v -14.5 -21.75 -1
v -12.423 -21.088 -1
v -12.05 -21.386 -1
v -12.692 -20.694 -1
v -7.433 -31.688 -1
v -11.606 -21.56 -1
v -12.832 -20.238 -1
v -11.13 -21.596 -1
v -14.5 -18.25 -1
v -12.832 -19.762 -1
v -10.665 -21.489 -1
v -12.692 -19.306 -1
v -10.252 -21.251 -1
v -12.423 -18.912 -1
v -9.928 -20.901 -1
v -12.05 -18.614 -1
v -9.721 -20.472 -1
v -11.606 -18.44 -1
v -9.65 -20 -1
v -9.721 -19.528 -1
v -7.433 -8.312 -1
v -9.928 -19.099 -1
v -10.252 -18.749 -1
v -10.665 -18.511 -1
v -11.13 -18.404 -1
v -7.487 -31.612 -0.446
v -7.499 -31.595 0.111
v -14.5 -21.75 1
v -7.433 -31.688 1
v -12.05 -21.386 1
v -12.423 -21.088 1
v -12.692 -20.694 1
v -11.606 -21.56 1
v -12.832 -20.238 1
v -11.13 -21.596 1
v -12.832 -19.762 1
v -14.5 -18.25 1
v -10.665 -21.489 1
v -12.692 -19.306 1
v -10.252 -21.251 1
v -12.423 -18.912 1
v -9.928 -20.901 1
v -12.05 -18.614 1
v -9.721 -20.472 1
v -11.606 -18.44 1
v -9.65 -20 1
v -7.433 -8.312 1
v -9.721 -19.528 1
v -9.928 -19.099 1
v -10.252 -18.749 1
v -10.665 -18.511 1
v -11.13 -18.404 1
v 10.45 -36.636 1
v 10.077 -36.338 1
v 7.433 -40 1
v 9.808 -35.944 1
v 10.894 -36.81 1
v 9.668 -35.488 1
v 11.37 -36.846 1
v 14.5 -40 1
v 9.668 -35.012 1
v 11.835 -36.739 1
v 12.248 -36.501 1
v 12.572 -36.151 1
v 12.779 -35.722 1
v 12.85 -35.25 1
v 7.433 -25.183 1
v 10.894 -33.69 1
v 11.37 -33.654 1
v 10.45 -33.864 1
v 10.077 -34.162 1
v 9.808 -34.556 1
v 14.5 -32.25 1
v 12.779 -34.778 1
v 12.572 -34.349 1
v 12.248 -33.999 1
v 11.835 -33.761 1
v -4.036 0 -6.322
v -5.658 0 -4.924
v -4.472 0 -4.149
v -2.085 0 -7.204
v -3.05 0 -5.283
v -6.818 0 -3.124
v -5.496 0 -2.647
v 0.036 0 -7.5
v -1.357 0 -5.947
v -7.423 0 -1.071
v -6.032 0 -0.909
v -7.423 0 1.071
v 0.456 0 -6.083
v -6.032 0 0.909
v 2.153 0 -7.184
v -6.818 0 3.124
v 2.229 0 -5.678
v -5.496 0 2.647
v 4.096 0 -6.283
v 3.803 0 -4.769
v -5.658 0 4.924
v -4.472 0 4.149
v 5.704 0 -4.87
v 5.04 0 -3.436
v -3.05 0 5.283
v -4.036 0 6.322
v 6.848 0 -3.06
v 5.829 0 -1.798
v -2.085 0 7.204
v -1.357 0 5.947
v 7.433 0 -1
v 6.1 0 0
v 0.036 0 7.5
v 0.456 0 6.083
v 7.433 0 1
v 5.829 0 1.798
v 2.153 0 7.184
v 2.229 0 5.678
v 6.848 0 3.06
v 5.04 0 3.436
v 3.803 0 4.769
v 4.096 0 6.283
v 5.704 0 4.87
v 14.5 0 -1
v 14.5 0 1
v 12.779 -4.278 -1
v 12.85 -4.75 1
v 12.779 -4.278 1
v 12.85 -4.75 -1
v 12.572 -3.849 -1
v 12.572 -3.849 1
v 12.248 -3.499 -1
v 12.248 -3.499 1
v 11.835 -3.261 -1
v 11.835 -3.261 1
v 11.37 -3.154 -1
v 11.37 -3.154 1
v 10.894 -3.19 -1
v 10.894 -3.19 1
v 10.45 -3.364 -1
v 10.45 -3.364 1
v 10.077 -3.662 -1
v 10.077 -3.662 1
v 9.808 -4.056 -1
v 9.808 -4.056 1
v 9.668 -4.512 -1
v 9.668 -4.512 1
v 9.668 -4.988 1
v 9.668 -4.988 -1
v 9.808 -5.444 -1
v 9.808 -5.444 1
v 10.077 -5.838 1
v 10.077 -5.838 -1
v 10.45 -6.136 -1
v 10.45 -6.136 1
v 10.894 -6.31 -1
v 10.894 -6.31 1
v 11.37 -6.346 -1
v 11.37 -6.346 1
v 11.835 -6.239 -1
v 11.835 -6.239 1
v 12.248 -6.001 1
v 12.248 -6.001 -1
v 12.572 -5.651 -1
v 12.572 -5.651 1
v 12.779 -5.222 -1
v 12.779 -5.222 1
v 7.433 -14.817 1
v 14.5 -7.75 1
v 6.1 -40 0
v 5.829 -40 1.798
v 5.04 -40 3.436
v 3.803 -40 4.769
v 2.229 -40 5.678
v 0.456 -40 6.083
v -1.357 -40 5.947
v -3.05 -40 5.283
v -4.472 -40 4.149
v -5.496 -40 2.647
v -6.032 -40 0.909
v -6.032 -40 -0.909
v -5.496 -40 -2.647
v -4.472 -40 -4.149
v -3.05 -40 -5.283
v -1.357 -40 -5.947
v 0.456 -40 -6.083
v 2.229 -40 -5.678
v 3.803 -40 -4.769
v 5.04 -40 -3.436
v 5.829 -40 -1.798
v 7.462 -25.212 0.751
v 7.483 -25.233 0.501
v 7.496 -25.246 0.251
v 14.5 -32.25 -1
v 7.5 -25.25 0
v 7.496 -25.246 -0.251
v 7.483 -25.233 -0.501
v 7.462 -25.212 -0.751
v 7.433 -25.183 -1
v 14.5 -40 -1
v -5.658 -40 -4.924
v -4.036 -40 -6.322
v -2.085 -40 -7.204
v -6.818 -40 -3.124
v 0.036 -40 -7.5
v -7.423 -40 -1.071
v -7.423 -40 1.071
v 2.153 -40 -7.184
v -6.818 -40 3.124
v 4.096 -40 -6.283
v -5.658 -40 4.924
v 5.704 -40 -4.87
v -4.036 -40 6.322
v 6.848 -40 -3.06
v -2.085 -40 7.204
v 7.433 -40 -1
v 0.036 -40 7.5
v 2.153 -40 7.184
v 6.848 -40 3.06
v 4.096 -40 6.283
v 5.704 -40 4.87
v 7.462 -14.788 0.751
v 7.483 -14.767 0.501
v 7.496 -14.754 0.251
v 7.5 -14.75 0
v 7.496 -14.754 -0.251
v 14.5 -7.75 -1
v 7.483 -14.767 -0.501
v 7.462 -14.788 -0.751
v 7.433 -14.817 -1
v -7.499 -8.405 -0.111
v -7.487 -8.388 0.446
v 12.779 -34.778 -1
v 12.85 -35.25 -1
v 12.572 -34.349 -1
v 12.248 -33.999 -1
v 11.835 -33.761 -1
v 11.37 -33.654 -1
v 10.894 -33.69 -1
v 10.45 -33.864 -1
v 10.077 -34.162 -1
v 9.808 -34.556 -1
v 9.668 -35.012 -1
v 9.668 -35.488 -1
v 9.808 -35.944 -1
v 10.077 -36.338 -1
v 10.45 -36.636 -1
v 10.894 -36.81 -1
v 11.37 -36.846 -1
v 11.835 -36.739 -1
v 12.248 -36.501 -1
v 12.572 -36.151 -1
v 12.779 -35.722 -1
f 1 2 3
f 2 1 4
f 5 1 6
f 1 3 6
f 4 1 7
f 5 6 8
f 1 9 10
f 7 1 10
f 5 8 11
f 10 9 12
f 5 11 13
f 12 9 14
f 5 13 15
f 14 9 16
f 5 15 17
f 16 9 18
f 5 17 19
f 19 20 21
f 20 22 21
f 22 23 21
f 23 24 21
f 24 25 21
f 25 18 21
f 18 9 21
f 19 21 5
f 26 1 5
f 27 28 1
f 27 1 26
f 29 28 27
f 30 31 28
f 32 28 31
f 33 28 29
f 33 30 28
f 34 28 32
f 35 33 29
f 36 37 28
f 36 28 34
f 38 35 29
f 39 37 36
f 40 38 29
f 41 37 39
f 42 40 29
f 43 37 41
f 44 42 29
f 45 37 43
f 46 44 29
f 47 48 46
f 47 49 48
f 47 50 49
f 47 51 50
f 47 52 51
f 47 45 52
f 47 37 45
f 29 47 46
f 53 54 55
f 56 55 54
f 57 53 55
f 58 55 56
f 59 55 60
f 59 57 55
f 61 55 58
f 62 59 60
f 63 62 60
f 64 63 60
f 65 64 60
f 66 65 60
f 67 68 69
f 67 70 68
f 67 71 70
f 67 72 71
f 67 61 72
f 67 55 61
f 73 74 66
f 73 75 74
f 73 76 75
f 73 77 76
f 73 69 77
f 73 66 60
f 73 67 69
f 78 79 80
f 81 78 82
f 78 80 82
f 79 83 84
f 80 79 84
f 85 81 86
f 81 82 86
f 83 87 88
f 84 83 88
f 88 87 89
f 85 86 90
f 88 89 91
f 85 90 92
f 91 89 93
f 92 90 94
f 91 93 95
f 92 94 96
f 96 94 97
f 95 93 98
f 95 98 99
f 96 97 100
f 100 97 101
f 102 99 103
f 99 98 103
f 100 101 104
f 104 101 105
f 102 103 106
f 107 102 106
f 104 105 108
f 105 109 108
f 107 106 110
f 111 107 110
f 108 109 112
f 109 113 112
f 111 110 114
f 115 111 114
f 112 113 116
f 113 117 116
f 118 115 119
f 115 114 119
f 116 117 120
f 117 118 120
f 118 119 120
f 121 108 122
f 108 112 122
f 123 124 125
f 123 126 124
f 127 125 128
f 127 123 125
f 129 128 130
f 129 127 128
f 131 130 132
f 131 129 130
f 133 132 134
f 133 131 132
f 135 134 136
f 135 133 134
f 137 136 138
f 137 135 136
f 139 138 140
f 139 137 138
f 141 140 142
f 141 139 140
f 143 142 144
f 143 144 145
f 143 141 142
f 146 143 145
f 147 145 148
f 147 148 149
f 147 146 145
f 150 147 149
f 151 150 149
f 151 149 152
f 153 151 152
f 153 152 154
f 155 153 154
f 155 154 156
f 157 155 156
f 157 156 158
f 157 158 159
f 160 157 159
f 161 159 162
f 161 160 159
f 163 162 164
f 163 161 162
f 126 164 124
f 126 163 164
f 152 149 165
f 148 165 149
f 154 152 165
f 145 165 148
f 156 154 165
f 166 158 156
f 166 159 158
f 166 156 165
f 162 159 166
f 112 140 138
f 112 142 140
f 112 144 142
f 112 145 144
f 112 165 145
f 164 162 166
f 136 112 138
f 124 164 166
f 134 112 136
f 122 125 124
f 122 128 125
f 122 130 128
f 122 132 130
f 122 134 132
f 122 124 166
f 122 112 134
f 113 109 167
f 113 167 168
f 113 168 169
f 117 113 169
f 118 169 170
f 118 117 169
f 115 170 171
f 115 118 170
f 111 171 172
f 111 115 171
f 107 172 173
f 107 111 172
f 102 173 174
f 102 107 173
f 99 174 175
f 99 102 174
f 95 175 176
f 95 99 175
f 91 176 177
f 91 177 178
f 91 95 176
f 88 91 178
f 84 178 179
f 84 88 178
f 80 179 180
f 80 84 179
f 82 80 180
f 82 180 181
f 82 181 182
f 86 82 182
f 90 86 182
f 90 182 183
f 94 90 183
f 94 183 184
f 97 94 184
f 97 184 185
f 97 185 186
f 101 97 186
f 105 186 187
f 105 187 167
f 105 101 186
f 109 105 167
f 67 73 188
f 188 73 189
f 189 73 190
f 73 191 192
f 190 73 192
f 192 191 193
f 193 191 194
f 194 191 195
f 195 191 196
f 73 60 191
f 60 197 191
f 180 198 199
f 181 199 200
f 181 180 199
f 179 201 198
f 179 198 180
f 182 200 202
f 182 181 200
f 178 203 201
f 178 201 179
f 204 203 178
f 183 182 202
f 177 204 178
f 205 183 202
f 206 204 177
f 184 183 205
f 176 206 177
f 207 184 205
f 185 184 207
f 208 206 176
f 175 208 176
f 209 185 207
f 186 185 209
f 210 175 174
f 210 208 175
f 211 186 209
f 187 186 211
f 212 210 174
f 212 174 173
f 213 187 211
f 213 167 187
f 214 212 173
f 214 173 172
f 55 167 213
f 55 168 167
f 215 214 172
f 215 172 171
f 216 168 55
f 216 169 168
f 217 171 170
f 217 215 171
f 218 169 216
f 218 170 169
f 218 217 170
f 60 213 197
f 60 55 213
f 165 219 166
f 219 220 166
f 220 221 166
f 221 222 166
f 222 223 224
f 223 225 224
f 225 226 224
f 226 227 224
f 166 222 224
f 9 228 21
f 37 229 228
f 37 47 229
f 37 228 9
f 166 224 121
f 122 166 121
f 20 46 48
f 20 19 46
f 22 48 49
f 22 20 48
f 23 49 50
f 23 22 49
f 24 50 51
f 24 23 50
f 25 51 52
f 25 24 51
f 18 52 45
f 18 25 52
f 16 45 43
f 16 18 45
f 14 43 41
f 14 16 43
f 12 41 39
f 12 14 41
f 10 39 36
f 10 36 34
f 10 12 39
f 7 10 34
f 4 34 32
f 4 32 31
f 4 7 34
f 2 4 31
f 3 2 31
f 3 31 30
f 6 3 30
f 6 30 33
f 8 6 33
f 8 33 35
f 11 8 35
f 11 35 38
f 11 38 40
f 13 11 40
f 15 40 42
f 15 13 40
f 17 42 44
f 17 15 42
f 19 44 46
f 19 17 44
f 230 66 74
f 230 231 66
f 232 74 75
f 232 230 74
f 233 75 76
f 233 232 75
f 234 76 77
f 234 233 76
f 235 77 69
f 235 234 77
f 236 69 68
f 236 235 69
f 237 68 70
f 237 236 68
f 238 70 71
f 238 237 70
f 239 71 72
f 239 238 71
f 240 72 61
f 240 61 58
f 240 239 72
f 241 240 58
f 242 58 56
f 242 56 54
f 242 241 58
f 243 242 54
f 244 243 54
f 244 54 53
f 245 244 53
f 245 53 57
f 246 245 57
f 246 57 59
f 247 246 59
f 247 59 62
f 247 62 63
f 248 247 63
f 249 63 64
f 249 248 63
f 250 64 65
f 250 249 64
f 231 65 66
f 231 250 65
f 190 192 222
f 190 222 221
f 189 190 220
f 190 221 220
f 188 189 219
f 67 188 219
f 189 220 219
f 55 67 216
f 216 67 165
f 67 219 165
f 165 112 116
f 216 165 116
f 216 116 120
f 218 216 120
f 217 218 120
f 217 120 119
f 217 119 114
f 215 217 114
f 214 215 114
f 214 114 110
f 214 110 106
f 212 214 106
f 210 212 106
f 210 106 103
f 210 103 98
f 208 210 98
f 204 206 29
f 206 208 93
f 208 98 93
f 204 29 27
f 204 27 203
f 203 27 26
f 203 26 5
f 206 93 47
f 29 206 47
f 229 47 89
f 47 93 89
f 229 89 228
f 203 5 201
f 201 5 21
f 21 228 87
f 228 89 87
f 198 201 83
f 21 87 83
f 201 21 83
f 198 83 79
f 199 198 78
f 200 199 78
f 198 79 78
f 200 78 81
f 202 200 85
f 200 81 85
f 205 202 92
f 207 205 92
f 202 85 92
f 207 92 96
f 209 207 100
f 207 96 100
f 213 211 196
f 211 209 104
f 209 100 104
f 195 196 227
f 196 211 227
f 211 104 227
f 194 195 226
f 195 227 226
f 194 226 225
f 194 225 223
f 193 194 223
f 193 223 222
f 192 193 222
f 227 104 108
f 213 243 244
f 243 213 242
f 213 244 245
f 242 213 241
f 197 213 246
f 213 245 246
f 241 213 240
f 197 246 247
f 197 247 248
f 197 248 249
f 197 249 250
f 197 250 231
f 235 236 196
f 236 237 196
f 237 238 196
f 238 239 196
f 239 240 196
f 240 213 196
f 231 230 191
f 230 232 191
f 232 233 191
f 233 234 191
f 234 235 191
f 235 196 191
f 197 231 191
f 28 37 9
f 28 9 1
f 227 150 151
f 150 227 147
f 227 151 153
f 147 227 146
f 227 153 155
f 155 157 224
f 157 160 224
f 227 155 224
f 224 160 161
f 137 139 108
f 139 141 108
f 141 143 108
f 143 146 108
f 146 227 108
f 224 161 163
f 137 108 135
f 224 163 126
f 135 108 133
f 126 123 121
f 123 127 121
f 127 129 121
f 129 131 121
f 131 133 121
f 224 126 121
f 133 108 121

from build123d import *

# Parameters (mm, degrees)
F0_R     = 7.5
F0_R_2   = 6.1
F1_DEPTH = 40
F2_R     = 1.6
F3_DEPTH = 1


with BuildPart() as f1:
    # F0 (on Front) → F1 (new body)
    with BuildSketch(Plane.XZ):
        Circle(F0_R)
        Circle(F0_R_2, mode=Mode.SUBTRACT)
    extrude(amount=F1_DEPTH)

    # F2 (on Top) → F3 (join, symmetric)
    with BuildSketch(Plane.XY):
        Polygon((14.5, 0), (6.5, 0), (6.5, -15.75), (14.5, -7.75), align=None)
        with Locations((11.25, -4.75)):
            Circle(F2_R, mode=Mode.SUBTRACT)
        Polygon((6.5, -24.25), (6.5, -40), (14.5, -40), (14.5, -32.25), align=None)
        with Locations((11.25, -35.25)):
            Circle(F2_R, mode=Mode.SUBTRACT)
        Polygon((-6.5, -33), (-6.5, -7), (-14.5, -18.25), (-14.5, -21.75), align=None)
        with Locations((-11.25, -20)):
            Circle(F2_R, mode=Mode.SUBTRACT)
    extrude(amount=F3_DEPTH, both=True)


solid = f1.part
